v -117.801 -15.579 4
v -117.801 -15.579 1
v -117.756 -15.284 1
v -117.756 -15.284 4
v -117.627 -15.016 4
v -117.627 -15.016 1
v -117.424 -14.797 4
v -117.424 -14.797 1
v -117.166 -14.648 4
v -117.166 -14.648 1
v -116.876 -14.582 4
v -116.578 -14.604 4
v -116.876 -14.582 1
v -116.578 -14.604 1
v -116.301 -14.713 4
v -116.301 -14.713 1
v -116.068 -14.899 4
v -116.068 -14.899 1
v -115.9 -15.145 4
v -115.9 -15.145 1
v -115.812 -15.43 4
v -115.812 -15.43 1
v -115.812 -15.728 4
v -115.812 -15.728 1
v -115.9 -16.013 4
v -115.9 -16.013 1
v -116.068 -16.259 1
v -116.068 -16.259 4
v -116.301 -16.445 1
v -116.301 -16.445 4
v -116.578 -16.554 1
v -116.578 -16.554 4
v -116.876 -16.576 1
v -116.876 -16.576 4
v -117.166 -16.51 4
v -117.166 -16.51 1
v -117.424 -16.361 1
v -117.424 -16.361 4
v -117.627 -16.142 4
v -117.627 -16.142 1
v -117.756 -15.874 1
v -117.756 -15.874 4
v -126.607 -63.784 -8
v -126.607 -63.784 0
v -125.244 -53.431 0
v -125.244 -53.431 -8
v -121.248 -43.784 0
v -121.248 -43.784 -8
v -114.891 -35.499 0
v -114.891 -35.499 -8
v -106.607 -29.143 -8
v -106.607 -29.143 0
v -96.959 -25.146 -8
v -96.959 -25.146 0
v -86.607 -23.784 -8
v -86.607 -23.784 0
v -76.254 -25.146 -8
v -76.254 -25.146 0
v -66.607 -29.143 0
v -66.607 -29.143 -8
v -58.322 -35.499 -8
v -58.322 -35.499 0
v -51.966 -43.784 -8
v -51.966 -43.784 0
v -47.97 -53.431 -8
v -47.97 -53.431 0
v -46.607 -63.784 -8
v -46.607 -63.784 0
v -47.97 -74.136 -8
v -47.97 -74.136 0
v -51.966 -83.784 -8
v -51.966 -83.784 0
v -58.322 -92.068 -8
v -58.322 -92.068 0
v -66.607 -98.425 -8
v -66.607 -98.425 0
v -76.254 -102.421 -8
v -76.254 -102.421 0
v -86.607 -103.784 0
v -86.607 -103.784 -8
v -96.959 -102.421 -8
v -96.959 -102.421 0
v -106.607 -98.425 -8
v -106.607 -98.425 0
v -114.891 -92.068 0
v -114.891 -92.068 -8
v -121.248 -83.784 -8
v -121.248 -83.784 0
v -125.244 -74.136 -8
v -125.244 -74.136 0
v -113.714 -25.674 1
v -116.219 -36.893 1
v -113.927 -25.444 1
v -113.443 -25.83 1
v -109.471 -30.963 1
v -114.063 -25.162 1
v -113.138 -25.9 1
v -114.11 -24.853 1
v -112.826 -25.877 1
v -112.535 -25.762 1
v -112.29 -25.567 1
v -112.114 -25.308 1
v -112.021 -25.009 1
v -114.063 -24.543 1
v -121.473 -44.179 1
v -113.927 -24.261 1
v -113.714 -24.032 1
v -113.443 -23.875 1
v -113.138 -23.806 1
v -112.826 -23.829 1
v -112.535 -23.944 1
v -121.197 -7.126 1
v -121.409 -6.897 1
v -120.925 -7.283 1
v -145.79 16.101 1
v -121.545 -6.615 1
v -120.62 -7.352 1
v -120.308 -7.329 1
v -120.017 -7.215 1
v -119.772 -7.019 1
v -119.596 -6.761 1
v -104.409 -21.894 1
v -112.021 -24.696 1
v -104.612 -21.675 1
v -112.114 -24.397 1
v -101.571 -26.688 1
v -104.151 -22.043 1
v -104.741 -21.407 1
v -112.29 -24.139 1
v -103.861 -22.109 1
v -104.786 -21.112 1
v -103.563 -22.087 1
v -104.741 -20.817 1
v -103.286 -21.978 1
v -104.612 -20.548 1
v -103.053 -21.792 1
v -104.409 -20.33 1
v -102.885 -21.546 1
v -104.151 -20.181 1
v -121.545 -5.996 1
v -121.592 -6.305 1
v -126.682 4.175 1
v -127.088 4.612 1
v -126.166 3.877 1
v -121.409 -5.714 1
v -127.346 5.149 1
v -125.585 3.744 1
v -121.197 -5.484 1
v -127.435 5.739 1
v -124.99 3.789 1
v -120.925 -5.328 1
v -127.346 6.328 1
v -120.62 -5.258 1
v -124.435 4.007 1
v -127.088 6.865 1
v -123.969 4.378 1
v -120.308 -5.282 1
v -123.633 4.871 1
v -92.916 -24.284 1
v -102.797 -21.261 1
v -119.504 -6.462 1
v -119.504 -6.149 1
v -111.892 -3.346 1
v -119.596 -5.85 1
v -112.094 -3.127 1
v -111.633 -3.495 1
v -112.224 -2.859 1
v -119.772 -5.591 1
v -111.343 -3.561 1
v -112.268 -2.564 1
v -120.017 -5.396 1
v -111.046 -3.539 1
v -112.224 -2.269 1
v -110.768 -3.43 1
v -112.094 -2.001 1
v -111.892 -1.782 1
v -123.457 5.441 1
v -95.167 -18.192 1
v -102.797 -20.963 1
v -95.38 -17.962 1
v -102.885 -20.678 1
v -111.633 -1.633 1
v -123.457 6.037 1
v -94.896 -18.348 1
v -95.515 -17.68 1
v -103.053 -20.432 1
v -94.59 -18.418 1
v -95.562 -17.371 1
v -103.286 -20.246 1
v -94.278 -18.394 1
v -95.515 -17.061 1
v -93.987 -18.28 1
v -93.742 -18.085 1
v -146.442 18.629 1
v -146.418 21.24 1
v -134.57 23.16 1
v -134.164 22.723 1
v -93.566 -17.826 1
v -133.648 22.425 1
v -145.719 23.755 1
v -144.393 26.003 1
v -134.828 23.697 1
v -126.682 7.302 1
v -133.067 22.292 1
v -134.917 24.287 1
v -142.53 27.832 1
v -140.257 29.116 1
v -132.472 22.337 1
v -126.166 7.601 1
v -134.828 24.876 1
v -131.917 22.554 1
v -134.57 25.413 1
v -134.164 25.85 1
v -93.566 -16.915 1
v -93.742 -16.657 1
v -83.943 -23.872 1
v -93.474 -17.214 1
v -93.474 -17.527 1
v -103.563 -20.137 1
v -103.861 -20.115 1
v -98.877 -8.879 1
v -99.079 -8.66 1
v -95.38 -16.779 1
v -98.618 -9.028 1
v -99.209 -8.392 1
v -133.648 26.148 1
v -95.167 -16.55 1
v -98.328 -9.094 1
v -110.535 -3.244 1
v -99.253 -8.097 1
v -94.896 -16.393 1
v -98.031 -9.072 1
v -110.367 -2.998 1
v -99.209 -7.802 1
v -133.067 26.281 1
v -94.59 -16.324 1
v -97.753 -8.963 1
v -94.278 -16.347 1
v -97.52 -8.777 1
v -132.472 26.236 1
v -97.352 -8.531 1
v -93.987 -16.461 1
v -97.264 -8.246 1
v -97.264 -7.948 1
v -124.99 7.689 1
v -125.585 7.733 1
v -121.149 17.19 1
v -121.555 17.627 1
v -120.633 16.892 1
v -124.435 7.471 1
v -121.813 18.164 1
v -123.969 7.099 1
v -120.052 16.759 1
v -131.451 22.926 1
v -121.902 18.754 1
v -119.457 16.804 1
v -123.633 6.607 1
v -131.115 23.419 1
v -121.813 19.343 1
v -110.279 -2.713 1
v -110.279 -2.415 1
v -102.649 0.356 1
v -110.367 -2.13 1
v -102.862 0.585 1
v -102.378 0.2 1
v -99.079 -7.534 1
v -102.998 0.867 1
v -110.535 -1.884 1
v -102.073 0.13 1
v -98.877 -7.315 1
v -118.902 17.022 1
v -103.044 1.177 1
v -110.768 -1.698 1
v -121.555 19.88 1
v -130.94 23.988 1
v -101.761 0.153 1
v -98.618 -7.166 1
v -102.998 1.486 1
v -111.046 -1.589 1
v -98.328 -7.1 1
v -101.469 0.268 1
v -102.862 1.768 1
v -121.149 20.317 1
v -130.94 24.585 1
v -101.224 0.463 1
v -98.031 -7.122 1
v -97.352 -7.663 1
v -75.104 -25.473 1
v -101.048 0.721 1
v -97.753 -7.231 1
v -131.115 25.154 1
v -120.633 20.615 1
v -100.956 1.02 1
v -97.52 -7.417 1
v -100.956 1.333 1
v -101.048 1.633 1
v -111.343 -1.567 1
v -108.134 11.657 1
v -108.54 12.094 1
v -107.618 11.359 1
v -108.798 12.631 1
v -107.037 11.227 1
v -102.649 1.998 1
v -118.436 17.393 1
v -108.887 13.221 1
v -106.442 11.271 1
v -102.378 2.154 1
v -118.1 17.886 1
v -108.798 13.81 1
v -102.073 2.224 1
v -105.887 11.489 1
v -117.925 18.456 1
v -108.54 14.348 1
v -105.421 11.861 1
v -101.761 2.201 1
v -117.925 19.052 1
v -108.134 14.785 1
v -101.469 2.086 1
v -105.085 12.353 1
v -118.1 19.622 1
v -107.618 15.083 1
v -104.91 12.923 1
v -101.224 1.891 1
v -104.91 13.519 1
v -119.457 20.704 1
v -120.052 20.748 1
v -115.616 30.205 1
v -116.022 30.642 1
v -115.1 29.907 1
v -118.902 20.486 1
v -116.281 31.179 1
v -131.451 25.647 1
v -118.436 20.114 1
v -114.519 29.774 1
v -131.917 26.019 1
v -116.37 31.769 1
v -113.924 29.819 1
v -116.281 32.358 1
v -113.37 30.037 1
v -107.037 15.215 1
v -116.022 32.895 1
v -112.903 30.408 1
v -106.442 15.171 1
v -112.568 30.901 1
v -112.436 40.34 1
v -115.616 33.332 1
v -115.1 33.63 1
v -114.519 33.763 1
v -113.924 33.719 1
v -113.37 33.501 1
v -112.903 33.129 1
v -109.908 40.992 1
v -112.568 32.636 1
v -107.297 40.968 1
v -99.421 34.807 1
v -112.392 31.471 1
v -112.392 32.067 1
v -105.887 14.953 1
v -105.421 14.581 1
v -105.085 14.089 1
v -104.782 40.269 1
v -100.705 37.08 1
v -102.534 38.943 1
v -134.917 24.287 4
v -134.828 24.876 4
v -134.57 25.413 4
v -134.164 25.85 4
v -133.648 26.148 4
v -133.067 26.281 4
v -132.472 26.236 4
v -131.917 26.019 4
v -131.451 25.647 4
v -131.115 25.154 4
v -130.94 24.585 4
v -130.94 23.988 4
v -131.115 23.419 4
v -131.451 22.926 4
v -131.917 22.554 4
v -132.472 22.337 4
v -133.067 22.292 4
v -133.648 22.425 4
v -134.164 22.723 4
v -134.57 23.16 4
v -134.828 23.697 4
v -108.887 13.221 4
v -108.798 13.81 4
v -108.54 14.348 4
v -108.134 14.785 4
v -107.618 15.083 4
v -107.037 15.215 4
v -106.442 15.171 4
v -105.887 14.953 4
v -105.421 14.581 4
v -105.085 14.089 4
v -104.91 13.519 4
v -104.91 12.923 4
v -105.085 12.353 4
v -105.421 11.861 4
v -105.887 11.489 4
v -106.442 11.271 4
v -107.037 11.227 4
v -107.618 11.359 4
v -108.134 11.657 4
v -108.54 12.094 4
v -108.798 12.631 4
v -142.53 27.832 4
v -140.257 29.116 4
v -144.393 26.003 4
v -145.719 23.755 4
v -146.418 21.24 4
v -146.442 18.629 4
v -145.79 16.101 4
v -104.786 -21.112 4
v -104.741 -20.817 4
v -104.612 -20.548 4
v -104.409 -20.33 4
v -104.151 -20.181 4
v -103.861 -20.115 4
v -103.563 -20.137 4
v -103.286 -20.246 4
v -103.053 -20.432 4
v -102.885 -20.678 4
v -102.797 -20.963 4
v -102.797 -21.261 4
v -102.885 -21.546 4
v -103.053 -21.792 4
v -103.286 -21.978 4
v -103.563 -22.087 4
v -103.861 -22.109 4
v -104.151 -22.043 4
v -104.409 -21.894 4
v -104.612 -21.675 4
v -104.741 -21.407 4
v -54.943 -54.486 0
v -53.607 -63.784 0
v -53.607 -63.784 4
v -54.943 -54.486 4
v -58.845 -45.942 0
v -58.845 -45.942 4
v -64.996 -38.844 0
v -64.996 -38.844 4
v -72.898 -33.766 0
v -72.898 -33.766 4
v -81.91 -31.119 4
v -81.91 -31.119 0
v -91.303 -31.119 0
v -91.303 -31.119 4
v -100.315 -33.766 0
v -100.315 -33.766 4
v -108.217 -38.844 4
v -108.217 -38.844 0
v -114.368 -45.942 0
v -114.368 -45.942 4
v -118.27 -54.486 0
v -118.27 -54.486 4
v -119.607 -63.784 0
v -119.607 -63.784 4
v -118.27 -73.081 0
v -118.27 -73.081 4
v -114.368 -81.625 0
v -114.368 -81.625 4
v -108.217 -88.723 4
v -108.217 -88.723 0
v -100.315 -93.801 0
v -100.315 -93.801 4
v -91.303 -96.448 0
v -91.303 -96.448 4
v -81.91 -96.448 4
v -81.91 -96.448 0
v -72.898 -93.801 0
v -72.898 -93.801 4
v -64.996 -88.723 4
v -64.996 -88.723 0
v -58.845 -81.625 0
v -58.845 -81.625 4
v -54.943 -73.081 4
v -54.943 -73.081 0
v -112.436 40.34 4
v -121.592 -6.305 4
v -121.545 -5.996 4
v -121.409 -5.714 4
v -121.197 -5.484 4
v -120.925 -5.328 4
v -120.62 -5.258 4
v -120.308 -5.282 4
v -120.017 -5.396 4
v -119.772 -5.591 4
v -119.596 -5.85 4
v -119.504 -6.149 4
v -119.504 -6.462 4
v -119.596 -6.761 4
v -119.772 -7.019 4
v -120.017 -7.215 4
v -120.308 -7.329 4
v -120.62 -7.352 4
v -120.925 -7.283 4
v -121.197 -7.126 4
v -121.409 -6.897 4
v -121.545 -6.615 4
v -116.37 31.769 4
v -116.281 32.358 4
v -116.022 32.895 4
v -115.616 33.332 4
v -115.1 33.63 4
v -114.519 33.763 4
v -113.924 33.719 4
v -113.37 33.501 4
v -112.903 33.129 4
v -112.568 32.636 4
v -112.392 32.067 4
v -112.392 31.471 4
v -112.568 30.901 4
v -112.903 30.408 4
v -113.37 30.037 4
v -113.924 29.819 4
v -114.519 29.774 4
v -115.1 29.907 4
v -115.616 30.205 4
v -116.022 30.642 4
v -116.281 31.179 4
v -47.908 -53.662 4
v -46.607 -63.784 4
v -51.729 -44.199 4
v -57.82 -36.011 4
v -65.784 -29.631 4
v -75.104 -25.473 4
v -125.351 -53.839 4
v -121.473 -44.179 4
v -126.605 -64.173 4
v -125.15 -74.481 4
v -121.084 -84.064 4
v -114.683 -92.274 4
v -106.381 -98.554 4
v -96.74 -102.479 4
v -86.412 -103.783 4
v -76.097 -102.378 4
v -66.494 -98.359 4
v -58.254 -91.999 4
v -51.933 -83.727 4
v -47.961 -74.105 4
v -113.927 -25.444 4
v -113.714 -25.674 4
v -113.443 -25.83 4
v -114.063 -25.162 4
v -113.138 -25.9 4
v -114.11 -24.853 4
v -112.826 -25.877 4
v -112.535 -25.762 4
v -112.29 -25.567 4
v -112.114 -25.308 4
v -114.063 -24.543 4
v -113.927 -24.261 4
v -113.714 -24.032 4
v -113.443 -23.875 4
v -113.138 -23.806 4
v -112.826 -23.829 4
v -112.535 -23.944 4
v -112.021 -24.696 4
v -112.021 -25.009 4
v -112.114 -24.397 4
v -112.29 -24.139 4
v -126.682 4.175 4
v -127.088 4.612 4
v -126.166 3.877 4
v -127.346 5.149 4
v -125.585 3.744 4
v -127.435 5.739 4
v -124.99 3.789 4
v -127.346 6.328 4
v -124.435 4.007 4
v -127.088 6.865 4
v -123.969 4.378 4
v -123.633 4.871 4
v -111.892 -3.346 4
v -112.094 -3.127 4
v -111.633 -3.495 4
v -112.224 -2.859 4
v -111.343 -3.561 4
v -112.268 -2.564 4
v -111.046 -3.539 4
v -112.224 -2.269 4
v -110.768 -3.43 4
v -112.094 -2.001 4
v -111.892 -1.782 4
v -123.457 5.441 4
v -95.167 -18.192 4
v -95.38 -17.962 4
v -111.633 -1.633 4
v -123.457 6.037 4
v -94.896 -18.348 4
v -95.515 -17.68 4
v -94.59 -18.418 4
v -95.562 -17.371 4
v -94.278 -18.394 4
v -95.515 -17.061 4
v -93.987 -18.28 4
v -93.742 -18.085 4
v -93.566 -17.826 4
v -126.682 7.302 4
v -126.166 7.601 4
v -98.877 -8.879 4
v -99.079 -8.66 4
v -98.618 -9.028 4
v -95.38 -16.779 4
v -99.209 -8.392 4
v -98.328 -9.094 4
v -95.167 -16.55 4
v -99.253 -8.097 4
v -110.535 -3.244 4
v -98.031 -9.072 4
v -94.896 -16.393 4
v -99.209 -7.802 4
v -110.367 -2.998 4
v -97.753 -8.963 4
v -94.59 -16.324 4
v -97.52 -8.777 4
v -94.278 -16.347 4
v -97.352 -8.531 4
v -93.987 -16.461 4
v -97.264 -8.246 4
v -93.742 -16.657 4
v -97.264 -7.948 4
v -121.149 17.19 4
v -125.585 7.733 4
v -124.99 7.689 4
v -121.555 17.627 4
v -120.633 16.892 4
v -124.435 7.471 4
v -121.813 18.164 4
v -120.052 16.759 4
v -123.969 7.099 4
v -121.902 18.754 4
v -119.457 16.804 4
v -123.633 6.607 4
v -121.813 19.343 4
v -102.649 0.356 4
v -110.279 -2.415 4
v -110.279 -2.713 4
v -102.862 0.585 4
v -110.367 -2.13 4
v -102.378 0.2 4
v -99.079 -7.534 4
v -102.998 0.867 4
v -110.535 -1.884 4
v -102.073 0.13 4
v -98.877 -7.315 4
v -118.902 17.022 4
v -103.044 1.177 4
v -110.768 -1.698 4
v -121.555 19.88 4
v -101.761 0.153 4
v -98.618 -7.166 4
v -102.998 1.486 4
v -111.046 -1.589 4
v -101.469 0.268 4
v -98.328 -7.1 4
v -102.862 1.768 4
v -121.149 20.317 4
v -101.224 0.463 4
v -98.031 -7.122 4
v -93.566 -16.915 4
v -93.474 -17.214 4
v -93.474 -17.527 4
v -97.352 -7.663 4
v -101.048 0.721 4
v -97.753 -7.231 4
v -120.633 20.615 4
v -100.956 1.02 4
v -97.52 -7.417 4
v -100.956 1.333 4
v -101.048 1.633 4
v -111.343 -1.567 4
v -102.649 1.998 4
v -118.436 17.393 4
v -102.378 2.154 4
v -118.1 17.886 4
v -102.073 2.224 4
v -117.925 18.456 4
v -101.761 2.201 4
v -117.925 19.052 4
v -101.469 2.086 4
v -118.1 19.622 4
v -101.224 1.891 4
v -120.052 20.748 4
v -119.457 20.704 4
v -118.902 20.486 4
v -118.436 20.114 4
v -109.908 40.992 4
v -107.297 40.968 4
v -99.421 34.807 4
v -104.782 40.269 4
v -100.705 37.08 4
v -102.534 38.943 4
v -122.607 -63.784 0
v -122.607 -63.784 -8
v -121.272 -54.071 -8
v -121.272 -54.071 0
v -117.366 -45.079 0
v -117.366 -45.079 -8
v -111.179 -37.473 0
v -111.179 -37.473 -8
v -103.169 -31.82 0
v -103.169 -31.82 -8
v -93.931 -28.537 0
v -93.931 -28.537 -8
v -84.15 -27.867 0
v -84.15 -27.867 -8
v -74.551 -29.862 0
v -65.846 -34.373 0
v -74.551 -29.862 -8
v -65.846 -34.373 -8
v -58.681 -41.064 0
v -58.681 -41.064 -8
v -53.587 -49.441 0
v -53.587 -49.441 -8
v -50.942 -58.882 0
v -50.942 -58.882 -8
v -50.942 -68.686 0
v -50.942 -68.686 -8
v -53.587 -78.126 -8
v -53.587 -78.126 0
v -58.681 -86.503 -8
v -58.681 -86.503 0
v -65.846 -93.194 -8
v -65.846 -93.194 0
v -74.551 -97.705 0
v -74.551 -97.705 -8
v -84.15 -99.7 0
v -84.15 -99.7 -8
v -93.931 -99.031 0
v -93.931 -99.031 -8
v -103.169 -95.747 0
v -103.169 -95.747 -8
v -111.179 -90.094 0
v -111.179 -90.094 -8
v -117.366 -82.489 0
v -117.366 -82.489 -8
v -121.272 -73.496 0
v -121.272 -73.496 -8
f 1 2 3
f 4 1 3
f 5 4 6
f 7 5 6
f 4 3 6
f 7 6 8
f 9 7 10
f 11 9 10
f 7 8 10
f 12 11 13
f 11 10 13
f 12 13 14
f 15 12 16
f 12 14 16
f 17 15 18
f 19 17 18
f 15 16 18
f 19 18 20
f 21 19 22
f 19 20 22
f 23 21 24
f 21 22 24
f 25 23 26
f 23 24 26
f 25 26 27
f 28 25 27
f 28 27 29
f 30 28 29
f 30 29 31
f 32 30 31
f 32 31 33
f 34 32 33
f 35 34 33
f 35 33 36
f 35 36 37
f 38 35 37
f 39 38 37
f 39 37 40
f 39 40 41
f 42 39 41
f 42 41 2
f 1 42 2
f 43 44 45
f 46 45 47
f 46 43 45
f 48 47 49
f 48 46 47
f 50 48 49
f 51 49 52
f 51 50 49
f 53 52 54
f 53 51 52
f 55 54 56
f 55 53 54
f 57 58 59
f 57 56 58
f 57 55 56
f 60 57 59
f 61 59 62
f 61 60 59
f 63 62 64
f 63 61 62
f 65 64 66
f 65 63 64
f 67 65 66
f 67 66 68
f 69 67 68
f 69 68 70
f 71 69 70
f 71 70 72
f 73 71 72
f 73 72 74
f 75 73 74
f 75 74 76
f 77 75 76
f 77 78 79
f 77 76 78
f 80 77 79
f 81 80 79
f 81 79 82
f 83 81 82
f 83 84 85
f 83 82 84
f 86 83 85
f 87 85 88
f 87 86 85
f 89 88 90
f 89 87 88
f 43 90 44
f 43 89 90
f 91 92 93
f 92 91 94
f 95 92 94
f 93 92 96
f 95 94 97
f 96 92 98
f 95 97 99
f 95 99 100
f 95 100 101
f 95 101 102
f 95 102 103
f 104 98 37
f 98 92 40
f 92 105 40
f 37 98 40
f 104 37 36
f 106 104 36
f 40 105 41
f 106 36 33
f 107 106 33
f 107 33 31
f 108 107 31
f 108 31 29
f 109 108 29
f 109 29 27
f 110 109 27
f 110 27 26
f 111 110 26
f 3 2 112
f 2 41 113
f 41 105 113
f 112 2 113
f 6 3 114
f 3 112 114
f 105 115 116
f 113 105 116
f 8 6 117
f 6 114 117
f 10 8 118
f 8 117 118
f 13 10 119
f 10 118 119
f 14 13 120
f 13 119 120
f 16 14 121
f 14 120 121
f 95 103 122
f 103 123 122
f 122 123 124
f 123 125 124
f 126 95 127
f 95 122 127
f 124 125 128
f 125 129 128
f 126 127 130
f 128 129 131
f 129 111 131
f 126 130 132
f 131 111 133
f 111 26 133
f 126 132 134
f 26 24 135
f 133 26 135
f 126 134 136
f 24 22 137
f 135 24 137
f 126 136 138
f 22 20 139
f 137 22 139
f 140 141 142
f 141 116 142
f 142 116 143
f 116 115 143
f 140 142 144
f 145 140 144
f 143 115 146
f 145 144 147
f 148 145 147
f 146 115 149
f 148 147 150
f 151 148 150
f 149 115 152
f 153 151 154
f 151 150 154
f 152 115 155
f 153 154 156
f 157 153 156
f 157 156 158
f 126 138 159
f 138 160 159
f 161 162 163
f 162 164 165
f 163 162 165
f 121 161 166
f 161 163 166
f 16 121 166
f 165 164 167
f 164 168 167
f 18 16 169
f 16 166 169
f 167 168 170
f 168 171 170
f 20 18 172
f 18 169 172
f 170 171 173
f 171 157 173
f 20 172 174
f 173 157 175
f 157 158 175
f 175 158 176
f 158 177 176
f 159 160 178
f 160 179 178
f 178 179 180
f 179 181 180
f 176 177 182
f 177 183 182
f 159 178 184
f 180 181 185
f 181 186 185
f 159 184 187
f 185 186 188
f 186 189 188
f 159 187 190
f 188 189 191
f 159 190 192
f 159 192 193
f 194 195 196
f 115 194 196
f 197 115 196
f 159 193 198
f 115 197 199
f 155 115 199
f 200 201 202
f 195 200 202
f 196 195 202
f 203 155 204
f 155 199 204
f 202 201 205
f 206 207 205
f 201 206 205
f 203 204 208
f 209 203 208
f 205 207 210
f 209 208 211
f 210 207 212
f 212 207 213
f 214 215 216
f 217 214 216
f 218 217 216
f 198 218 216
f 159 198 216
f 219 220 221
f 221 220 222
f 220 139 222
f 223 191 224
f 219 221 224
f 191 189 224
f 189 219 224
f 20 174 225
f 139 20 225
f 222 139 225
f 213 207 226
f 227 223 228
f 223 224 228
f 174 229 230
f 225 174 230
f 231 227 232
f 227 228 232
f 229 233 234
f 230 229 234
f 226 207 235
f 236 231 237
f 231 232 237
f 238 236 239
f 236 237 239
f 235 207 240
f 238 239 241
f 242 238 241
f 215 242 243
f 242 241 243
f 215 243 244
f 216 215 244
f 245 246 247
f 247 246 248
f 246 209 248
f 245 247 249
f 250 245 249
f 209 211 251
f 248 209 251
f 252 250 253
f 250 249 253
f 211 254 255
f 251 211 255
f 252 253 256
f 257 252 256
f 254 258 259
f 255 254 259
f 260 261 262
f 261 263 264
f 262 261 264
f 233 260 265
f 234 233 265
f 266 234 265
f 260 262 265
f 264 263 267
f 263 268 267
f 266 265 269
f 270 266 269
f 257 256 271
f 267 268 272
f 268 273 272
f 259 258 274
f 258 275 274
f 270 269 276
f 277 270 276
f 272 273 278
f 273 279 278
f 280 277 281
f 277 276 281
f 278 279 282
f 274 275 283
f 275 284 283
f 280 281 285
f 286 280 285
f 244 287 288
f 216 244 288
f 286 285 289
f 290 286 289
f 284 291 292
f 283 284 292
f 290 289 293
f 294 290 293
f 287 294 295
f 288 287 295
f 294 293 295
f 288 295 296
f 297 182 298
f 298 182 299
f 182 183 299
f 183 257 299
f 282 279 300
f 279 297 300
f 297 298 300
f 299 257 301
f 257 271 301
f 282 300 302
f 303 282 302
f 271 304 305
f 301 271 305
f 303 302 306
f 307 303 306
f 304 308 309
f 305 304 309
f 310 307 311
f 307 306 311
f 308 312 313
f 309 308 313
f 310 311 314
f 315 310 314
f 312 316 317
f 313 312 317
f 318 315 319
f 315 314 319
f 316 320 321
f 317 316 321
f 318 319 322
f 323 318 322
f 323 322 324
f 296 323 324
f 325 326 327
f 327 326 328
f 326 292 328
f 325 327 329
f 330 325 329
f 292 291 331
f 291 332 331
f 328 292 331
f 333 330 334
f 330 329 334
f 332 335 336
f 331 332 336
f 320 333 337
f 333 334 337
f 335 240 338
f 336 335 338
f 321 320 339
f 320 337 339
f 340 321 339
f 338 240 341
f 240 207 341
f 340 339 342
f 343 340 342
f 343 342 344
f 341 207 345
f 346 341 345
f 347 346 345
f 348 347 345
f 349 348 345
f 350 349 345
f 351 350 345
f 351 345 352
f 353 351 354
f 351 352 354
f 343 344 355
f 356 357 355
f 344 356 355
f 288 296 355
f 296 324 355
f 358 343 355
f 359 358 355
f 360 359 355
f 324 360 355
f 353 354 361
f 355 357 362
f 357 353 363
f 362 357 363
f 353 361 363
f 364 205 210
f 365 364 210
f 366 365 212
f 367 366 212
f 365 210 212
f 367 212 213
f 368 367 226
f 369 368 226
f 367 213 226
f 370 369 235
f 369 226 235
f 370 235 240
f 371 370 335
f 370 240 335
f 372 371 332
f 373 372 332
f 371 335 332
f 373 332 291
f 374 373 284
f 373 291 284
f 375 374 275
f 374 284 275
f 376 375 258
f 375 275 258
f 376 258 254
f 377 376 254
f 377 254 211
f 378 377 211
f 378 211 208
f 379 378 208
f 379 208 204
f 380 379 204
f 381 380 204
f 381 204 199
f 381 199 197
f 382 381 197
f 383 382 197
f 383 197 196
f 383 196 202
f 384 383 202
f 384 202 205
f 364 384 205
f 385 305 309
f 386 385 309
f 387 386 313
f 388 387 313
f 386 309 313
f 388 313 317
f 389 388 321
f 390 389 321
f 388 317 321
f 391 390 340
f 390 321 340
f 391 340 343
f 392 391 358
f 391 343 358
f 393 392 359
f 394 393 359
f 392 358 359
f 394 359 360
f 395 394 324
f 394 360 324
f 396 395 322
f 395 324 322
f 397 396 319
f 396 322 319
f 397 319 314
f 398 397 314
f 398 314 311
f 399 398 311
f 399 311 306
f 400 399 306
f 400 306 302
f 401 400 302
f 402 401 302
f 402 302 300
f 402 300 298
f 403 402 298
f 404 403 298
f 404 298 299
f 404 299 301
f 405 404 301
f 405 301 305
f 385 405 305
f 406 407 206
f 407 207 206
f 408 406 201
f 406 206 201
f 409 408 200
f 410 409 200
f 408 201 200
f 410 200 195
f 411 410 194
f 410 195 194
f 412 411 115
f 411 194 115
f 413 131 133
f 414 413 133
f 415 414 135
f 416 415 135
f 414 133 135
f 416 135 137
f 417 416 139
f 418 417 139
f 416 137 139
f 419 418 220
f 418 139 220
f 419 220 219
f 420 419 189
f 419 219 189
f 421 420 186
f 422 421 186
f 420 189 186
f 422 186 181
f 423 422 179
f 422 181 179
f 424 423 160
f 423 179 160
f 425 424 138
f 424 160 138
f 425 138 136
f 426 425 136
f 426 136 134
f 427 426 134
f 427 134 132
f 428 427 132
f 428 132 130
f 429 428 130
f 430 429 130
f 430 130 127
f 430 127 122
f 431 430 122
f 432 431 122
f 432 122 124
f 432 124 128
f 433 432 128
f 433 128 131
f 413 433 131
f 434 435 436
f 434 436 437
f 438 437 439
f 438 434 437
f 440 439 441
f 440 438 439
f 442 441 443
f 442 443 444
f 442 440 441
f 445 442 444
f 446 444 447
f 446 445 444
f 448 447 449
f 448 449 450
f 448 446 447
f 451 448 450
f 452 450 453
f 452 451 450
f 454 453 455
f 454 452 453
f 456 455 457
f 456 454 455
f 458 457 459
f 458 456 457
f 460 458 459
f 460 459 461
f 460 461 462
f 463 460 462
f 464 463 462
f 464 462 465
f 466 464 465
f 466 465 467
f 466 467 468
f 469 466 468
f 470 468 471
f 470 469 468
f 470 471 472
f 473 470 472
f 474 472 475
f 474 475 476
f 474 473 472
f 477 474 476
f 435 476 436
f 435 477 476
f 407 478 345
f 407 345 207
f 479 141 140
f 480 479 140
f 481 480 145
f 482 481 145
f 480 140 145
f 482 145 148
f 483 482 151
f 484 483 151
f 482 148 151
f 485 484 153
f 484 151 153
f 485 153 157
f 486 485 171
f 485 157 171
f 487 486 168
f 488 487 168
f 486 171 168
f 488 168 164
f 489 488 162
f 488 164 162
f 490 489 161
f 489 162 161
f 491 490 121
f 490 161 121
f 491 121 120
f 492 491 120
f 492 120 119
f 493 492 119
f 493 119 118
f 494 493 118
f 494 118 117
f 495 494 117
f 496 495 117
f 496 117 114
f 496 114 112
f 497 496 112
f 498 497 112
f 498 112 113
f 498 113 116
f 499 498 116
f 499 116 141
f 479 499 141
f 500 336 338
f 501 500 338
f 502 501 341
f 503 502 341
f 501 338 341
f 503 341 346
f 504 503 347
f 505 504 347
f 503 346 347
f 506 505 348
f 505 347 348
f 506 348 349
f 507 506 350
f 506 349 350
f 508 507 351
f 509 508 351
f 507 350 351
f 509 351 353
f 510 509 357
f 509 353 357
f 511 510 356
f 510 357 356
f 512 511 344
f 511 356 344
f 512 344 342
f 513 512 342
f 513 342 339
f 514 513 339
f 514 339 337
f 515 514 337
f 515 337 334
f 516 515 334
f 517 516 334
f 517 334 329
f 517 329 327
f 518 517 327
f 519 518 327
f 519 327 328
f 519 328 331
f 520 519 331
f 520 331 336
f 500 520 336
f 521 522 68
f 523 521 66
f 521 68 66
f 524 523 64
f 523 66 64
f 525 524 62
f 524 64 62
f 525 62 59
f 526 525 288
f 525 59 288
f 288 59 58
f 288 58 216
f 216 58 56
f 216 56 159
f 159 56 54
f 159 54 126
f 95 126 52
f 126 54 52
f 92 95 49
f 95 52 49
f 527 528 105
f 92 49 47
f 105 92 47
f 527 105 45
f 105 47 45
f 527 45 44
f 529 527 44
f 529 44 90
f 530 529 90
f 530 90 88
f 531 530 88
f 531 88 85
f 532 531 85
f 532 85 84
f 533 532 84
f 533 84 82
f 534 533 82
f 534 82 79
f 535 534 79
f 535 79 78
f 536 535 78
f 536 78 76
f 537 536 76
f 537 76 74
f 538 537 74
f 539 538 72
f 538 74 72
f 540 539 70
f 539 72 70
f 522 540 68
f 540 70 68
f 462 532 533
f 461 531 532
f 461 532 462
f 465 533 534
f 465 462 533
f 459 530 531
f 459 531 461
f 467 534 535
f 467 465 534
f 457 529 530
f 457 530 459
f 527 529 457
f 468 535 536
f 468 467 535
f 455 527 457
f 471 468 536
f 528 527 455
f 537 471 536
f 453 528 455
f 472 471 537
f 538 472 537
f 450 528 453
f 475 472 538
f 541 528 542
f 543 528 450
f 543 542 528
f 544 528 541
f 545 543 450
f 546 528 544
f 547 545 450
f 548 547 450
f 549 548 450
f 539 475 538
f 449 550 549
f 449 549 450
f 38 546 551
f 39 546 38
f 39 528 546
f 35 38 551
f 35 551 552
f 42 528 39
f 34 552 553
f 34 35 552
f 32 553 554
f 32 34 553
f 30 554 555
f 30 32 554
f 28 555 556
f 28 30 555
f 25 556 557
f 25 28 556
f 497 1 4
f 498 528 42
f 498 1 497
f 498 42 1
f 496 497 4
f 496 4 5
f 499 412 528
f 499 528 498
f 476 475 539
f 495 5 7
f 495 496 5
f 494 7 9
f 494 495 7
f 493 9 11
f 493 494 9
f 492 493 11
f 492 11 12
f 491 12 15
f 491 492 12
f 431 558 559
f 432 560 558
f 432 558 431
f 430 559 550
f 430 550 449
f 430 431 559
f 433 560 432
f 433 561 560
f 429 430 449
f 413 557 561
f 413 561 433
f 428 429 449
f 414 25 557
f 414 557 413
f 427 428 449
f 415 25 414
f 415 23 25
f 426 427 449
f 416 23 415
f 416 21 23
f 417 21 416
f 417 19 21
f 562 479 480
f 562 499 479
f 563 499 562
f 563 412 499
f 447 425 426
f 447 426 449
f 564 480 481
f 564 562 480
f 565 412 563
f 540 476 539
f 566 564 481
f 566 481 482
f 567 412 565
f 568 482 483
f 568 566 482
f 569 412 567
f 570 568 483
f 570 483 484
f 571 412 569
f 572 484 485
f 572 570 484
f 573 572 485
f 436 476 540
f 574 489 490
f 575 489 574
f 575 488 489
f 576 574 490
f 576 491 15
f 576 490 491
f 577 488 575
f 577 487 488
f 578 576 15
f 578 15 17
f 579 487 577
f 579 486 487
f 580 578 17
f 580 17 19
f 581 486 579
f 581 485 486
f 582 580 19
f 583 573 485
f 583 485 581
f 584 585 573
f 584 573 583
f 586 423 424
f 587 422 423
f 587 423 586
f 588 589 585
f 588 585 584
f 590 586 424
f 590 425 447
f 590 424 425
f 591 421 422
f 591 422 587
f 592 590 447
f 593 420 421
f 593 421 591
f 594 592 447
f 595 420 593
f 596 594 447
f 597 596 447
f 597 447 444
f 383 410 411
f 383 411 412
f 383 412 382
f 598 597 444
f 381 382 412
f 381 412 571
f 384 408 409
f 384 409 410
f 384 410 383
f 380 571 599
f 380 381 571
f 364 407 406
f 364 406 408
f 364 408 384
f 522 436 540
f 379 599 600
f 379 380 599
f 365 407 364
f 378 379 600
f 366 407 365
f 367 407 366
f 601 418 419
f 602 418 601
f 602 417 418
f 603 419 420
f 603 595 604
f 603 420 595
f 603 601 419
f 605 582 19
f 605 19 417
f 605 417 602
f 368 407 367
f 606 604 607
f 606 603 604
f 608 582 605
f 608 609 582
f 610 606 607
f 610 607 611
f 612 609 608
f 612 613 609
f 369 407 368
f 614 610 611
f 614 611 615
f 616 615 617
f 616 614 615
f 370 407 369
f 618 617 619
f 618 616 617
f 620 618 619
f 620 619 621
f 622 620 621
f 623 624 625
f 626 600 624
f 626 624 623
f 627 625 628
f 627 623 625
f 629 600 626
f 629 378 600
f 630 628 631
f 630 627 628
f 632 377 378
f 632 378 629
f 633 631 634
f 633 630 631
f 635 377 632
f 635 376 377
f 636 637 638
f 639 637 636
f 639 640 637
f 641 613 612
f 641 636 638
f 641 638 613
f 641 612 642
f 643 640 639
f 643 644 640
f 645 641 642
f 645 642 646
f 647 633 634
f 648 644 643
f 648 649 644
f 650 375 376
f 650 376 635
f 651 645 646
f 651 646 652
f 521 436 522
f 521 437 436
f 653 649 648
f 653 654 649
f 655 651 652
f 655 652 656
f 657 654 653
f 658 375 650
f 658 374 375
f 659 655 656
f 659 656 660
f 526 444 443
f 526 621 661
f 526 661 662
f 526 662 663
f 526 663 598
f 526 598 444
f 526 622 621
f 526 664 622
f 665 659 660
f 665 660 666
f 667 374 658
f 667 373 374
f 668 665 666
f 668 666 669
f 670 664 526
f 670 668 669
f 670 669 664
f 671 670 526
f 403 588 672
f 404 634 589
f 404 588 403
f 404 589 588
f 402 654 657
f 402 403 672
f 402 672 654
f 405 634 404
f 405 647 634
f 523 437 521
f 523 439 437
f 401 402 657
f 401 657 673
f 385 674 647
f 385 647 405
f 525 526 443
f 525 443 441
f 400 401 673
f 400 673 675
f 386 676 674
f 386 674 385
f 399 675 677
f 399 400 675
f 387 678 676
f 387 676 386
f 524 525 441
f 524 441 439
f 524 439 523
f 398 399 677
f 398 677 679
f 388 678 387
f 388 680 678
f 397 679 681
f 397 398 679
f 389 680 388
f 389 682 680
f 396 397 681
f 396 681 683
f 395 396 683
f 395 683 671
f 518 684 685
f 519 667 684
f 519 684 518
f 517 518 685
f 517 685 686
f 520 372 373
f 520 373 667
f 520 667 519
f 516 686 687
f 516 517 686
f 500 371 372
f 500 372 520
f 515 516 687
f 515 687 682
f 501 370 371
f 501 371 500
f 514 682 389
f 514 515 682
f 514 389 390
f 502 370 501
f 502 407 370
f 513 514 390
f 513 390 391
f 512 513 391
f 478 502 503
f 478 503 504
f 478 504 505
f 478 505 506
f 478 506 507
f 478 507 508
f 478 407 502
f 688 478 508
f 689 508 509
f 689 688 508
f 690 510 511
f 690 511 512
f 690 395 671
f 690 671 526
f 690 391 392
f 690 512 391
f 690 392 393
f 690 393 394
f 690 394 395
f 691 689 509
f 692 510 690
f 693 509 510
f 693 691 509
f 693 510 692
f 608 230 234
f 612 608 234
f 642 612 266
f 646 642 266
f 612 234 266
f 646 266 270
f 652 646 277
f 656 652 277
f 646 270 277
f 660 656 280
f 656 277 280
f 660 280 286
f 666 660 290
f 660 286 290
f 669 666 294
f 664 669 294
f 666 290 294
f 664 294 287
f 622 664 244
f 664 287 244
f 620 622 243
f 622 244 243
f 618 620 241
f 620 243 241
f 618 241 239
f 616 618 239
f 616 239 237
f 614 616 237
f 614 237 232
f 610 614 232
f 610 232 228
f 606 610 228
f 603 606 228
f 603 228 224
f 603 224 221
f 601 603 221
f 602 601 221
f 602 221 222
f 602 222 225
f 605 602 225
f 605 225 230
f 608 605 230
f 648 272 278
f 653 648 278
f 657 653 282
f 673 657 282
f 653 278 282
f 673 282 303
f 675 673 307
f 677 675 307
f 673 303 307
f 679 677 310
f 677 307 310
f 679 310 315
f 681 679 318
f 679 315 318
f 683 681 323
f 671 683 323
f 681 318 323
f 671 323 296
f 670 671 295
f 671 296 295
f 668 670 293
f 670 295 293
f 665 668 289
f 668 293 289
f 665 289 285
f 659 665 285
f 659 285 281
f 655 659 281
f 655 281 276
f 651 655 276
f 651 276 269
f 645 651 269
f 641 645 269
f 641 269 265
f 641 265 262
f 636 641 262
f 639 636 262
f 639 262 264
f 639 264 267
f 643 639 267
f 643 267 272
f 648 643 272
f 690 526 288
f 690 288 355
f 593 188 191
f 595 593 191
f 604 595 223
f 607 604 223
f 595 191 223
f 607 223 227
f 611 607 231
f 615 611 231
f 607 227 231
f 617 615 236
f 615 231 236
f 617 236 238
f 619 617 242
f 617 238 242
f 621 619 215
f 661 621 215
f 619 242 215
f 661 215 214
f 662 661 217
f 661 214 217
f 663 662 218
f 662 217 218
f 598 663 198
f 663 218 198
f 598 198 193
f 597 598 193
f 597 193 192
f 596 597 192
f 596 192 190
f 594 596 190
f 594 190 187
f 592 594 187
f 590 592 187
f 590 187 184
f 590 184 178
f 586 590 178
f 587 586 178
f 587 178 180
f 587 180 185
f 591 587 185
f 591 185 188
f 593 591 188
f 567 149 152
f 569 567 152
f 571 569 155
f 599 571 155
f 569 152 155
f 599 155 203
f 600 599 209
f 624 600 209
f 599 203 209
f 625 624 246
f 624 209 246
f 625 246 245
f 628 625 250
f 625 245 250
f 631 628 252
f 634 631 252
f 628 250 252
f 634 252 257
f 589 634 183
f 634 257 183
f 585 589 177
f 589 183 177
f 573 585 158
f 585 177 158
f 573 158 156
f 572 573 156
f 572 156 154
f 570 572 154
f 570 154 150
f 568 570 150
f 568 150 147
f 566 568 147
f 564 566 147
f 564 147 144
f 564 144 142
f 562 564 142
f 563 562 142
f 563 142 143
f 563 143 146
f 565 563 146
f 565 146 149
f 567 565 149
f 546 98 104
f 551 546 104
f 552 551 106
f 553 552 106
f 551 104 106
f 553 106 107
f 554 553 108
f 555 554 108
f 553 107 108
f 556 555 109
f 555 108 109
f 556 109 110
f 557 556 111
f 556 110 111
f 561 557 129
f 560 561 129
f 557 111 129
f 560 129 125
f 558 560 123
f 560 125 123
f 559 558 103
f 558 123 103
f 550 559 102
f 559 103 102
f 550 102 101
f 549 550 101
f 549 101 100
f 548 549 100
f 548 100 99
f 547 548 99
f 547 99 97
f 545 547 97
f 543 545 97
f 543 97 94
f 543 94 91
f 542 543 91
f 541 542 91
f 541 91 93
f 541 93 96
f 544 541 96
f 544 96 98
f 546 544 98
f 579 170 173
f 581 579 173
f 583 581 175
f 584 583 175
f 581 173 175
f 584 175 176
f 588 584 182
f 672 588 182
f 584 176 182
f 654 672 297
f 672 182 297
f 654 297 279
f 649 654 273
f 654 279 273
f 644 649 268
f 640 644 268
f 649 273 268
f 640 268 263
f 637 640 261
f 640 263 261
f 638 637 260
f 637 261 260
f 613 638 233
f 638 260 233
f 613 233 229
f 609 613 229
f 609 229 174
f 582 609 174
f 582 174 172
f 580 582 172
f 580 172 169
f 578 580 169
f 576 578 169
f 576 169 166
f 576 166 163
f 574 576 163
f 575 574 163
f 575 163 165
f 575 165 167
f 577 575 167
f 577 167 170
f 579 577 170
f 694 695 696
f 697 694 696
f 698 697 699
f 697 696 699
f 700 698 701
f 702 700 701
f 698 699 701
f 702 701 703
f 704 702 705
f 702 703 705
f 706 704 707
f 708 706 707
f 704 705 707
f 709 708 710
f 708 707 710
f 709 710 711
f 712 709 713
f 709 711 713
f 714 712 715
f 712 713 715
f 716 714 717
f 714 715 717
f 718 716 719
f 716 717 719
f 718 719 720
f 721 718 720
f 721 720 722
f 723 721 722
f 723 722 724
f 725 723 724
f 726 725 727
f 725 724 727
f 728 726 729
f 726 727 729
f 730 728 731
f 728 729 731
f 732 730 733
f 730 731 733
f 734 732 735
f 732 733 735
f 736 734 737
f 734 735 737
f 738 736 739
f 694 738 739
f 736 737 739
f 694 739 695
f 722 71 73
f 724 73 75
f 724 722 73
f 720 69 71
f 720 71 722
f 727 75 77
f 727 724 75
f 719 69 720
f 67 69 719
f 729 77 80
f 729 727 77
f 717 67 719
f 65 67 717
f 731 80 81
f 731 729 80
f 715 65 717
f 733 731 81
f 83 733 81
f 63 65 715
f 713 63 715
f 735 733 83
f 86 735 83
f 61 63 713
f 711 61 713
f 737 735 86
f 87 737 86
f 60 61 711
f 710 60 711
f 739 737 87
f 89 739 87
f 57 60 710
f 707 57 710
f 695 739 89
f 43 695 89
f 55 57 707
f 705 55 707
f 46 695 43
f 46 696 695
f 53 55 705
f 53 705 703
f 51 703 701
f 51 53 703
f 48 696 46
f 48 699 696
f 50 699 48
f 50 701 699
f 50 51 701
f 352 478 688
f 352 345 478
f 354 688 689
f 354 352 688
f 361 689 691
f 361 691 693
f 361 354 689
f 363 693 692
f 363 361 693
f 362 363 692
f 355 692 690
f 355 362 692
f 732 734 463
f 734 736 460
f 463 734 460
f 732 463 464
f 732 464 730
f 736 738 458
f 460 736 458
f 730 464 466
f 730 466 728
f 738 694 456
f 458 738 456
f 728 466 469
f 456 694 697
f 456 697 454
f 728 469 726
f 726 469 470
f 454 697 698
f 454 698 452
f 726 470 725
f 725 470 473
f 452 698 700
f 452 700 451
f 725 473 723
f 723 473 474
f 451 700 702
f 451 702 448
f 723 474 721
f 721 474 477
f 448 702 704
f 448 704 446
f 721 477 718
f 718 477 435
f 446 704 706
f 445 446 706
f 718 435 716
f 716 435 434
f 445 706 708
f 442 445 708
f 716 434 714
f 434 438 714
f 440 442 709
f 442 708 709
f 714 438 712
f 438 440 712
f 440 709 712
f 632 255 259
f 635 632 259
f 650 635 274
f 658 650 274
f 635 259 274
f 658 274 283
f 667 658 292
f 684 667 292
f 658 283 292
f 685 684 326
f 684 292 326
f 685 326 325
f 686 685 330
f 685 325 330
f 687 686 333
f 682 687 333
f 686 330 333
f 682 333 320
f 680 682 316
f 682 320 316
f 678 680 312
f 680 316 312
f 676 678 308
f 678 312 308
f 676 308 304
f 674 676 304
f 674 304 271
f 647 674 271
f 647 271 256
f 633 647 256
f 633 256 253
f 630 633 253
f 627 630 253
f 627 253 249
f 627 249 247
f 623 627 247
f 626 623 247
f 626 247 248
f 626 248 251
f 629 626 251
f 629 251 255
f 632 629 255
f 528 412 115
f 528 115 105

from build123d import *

# Parameters (mm, degrees)
SKETCH_1_R          = 40
SKETCH_1_R_2        = 33
EXTRUDE_1_DEPTH     = 4
EXTRUDE_START       = 8
SKETCH_2_R          = 40
SKETCH_2_R_2        = 36
EXTRUDE_2_DEPTH     = 8
EXTRUDE_3_DEPTH     = 3
SKETCH_5_R          = 1.05
SKETCH_5_R_2        = 1
SKETCH_5_R_3        = 2
CUT_EXTRUDE_1_DEPTH = 5
FILLET_1_R          = 10


with BuildPart() as part:
    # 草图1 → 凸台-拉伸1 (new body)
    with BuildSketch(Plane.XY):
        with Locations((-86.606649797, -63.783530386)):
            Circle(SKETCH_1_R)
        with Locations((-86.606649797, -63.783530386)):
            Circle(SKETCH_1_R_2, mode=Mode.SUBTRACT)
    extrude(amount=EXTRUDE_1_DEPTH)

    # 草图2 → 凸台-拉伸2 (add)
    with BuildSketch(Plane(origin=(0, 0, 0), x_dir=(-1, 0, 0), z_dir=(0, 0, -1)).offset(EXTRUDE_START)):
        with Locations((86.606649797, -63.783530386)):
            Circle(SKETCH_2_R)
        with Locations((86.606649797, -63.783530386)):
            Circle(SKETCH_2_R_2, mode=Mode.SUBTRACT)
    extrude(amount=-EXTRUDE_2_DEPTH)

    # 草图4 → 凸台-拉伸3 (add)
    with BuildSketch(Plane.XY.offset(4)):
        with BuildLine():
            Line((-103.161659788, 44.080644126), (-149.530913489, 25.375235519))
            Line((-149.530913489, 25.375235519), (-119.454633349, -49.181524695))
            ThreePointArc((-119.454633349, -49.181524695), (-100.016535475, -30.541466329), (-73.085379648, -30.476116088))
            Line((-73.085379648, -30.476116088), (-103.161659788, 44.080644126))
        make_face()
    extrude(amount=-EXTRUDE_3_DEPTH)

    # 草图5 → 切除-拉伸1 (cut)
    with BuildSketch(Plane(origin=(0, 0, 1), x_dir=(-1, 0, 0), z_dir=(0, 0, -1))):
        with Locations((113.059715781, -24.852893212)):
            Circle(SKETCH_5_R)
        with Locations((120.541879224, -6.305191731)):
            Circle(SKETCH_5_R)
        with Locations((101.994177743, 1.176971711)):
            Circle(SKETCH_5_R)
        with Locations((94.512014301, -17.370729769)):
            Circle(SKETCH_5_R)
        with Locations((116.800797503, -15.579042472)):
            Circle(SKETCH_5_R_2)
        with Locations((98.253096022, -8.096879029)):
            Circle(SKETCH_5_R_2)
        with Locations((103.785865041, -21.111811491)):
            Circle(SKETCH_5_R_2)
        with Locations((111.268028484, -2.56411001)):
            Circle(SKETCH_5_R_2)
        with Locations((114.369508098, 31.768673665)):
            Circle(SKETCH_5_R_3)
        with Locations((132.917209579, 24.286510222)):
            Circle(SKETCH_5_R_3)
        with Locations((119.902277117, 18.753741203)):
            Circle(SKETCH_5_R_3)
        with Locations((125.435046136, 5.738808742)):
            Circle(SKETCH_5_R_3)
        with Locations((106.887344656, 13.220972184)):
            Circle(SKETCH_5_R_3)
    extrude(amount=-CUT_EXTRUDE_1_DEPTH, mode=Mode.SUBTRACT)

    # 圆角1
    fillet_1_edges = [part.edges().sort_by_distance(p)[0] for p in [
        (-149.530913489, 25.375235519, 2.5),
        (-103.161659788, 44.080644126, 2.5),
    ]]
    fillet(fillet_1_edges, radius=FILLET_1_R)


solid = part.part
